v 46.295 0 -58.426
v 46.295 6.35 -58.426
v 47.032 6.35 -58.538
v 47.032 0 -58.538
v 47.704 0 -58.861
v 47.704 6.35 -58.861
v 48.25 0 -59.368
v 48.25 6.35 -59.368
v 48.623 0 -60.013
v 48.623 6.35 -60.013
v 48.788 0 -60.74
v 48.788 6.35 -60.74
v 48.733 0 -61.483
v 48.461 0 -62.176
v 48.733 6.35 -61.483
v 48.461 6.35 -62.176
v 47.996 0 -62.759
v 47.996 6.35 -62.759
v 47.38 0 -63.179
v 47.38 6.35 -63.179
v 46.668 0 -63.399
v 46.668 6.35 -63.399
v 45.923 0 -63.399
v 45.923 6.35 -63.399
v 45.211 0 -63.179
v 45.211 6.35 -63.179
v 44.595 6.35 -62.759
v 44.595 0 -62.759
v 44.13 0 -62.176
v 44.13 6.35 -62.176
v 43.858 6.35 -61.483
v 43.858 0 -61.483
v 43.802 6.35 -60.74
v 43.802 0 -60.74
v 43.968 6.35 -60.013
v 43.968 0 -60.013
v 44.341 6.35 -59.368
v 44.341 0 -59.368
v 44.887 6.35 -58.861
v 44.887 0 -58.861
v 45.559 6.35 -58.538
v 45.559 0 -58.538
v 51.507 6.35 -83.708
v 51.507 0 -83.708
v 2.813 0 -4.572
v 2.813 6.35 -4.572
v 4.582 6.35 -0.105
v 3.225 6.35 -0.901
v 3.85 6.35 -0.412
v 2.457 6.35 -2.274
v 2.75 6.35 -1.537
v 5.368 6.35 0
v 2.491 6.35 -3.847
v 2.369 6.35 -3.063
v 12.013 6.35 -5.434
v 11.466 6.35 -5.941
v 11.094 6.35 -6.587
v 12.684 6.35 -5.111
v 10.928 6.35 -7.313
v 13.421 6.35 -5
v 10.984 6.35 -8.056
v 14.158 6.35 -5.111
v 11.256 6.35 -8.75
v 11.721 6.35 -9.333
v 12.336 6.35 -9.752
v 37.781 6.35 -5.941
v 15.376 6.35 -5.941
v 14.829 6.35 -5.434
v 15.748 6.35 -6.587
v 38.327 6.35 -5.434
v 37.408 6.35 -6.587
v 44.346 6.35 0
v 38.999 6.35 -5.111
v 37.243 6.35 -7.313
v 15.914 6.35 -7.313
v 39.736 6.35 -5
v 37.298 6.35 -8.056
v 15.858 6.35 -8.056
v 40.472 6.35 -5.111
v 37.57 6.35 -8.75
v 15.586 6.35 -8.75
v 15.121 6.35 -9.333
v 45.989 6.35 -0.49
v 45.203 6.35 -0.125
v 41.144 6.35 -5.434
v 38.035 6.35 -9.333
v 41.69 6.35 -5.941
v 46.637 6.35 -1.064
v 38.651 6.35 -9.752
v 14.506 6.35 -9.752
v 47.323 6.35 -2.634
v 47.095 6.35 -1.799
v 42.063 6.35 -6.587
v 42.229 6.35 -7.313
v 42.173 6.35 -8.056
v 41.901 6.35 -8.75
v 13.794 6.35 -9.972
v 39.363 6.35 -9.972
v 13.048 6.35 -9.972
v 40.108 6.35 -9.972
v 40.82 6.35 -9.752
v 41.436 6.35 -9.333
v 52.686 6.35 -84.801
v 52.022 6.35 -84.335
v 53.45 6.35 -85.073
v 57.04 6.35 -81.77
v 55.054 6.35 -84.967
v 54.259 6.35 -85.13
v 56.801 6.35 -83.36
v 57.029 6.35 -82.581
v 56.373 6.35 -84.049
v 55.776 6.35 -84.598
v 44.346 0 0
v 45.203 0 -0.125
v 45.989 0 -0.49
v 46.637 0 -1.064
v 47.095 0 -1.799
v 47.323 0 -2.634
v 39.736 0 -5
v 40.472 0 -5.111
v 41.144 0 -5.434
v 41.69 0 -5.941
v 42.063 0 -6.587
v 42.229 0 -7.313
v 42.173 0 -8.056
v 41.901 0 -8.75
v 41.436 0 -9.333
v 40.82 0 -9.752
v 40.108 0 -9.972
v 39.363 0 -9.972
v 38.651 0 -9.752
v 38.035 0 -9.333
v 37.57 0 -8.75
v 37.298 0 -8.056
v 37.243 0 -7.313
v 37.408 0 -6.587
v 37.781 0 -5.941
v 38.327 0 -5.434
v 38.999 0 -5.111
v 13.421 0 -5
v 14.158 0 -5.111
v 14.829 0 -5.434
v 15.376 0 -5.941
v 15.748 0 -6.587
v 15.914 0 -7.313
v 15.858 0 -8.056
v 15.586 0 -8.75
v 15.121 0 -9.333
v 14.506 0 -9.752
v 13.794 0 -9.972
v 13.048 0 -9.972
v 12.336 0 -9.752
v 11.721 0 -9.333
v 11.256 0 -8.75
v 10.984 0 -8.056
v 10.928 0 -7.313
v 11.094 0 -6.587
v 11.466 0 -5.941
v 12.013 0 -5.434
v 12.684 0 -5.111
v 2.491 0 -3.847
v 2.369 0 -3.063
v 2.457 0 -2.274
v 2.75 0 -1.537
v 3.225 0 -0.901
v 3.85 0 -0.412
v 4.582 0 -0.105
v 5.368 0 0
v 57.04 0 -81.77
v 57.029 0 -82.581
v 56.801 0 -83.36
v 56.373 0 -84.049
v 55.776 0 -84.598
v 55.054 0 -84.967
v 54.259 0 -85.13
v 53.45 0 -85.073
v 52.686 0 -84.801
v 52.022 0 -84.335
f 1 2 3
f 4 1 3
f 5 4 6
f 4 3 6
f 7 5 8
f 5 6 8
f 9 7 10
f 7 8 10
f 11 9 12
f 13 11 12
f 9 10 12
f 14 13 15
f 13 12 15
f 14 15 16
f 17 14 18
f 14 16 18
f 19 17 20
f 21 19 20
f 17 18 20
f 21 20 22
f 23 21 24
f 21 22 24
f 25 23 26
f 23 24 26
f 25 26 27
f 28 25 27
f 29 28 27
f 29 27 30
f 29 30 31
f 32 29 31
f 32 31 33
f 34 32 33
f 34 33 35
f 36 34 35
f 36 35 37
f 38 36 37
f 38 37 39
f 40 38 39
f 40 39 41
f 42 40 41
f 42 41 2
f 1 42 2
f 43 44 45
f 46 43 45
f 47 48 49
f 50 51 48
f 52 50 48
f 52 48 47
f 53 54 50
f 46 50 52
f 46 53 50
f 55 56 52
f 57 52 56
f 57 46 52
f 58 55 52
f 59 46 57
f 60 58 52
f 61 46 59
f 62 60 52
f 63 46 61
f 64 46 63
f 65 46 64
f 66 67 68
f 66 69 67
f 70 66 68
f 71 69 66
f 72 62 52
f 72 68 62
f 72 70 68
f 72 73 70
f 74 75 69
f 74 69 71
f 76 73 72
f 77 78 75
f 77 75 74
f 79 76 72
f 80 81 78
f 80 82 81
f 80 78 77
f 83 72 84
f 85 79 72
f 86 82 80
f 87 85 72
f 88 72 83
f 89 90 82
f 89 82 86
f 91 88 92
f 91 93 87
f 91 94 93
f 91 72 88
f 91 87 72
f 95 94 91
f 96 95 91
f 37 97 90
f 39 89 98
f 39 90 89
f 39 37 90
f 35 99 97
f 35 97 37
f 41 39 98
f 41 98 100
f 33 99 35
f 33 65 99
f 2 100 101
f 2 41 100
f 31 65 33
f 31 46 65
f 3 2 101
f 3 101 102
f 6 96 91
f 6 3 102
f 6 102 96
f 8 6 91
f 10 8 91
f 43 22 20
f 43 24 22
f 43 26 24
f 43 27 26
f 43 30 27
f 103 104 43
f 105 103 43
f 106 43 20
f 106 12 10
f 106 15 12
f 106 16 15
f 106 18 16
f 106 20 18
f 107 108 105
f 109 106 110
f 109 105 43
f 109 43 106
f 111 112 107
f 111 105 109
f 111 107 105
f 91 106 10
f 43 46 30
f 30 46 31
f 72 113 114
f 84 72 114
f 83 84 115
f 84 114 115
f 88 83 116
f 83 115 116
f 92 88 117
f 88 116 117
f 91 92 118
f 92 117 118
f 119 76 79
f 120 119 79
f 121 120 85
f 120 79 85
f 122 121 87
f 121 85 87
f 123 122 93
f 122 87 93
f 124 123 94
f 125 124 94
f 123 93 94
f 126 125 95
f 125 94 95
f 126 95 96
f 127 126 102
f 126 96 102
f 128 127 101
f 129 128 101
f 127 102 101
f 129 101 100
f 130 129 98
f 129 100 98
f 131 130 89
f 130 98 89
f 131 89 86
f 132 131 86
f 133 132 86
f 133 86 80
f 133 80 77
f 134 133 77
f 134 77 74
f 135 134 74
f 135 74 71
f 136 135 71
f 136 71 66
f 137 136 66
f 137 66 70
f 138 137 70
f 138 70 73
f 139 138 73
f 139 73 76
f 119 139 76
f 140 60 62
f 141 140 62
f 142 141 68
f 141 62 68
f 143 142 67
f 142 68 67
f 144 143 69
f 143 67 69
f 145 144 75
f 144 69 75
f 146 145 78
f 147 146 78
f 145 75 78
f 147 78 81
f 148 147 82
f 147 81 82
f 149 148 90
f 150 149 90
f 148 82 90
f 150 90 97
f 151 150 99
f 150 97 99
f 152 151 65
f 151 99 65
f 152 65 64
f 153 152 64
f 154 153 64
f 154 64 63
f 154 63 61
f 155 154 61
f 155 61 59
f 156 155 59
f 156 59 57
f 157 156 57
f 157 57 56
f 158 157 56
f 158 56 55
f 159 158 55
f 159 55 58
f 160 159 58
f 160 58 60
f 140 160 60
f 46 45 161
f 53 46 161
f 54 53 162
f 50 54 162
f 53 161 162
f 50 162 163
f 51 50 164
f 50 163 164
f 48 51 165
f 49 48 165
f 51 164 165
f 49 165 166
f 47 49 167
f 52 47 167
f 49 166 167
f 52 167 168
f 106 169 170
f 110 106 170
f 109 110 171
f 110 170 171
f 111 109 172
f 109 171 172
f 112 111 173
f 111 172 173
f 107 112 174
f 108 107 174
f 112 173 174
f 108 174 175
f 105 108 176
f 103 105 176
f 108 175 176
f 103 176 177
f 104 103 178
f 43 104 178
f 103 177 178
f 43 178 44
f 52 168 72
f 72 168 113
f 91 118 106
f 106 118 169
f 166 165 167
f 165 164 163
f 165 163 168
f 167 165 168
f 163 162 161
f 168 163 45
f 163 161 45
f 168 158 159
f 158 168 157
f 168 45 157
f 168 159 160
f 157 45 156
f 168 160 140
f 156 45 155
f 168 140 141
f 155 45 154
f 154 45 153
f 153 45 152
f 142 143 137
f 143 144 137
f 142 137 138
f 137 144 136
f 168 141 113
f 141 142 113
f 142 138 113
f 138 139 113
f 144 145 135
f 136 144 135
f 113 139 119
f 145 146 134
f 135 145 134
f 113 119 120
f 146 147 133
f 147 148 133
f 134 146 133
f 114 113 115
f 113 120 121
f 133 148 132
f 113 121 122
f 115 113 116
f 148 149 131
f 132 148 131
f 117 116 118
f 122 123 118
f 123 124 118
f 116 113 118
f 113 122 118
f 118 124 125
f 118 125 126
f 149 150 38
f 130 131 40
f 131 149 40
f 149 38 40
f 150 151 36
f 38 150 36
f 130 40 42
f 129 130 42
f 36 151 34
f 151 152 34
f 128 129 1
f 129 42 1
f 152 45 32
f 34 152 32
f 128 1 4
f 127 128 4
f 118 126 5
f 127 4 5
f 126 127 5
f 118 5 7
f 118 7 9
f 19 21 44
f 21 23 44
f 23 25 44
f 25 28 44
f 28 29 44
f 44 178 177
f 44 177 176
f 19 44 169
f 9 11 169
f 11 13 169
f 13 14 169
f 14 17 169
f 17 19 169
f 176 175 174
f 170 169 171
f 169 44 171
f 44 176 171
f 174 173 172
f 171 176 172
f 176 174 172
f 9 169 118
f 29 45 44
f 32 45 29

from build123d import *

# Parameters (mm, degrees)
BOSS_EXTRUDE1_DEPTH = 6.35
SKETCH2_R           = 2.5
CUT_EXTRUDE1_DEPTH  = 103.686827993


with BuildPart() as part:
    # Sketch1 → Boss-Extrude1 (new body)
    with BuildSketch(Plane(origin=(0, 0, 0), x_dir=(1, 0, 0), z_dir=(0, 1, 0))):
        with BuildLine():
            Line((5.368406408, 0), (44.345824206, 0))
            ThreePointArc((44.345824206, 0), (46.333684351, 0.753132838), (47.323462661, 2.63439197))
            Line((47.323462661, 2.63439197), (57.040137924, 81.77036144))
            ThreePointArc((57.040137924, 81.77036144), (55.05416359, 84.967329968), (51.507452969, 83.708145472))
            Line((51.507452969, 83.708145472), (2.813359907, 4.572176002))
            ThreePointArc((2.813359907, 4.572176002), (2.749577661, 1.536532885), (5.368406408, 0))
        make_face()
    extrude(amount=BOSS_EXTRUDE1_DEPTH)

    # Sketch2 → Cut-Extrude1 (cut, through all)
    with BuildSketch(Plane(origin=(0, 6.35, 0), x_dir=(1, 0, 0), z_dir=(0, 1, 0))):
        with Locations(Location((13.421016019, 7.5, 0), (0, 0, 270))):
            Circle(SKETCH2_R)
        with Locations(Location((46.29547273, 60.926439205, 0), (0, 0, 270))):
            Circle(SKETCH2_R)
        with Locations(Location((39.735530851, 7.5, 0), (0, 0, 270))):
            Circle(SKETCH2_R)
    extrude(amount=-CUT_EXTRUDE1_DEPTH, mode=Mode.SUBTRACT)


solid = part.part
